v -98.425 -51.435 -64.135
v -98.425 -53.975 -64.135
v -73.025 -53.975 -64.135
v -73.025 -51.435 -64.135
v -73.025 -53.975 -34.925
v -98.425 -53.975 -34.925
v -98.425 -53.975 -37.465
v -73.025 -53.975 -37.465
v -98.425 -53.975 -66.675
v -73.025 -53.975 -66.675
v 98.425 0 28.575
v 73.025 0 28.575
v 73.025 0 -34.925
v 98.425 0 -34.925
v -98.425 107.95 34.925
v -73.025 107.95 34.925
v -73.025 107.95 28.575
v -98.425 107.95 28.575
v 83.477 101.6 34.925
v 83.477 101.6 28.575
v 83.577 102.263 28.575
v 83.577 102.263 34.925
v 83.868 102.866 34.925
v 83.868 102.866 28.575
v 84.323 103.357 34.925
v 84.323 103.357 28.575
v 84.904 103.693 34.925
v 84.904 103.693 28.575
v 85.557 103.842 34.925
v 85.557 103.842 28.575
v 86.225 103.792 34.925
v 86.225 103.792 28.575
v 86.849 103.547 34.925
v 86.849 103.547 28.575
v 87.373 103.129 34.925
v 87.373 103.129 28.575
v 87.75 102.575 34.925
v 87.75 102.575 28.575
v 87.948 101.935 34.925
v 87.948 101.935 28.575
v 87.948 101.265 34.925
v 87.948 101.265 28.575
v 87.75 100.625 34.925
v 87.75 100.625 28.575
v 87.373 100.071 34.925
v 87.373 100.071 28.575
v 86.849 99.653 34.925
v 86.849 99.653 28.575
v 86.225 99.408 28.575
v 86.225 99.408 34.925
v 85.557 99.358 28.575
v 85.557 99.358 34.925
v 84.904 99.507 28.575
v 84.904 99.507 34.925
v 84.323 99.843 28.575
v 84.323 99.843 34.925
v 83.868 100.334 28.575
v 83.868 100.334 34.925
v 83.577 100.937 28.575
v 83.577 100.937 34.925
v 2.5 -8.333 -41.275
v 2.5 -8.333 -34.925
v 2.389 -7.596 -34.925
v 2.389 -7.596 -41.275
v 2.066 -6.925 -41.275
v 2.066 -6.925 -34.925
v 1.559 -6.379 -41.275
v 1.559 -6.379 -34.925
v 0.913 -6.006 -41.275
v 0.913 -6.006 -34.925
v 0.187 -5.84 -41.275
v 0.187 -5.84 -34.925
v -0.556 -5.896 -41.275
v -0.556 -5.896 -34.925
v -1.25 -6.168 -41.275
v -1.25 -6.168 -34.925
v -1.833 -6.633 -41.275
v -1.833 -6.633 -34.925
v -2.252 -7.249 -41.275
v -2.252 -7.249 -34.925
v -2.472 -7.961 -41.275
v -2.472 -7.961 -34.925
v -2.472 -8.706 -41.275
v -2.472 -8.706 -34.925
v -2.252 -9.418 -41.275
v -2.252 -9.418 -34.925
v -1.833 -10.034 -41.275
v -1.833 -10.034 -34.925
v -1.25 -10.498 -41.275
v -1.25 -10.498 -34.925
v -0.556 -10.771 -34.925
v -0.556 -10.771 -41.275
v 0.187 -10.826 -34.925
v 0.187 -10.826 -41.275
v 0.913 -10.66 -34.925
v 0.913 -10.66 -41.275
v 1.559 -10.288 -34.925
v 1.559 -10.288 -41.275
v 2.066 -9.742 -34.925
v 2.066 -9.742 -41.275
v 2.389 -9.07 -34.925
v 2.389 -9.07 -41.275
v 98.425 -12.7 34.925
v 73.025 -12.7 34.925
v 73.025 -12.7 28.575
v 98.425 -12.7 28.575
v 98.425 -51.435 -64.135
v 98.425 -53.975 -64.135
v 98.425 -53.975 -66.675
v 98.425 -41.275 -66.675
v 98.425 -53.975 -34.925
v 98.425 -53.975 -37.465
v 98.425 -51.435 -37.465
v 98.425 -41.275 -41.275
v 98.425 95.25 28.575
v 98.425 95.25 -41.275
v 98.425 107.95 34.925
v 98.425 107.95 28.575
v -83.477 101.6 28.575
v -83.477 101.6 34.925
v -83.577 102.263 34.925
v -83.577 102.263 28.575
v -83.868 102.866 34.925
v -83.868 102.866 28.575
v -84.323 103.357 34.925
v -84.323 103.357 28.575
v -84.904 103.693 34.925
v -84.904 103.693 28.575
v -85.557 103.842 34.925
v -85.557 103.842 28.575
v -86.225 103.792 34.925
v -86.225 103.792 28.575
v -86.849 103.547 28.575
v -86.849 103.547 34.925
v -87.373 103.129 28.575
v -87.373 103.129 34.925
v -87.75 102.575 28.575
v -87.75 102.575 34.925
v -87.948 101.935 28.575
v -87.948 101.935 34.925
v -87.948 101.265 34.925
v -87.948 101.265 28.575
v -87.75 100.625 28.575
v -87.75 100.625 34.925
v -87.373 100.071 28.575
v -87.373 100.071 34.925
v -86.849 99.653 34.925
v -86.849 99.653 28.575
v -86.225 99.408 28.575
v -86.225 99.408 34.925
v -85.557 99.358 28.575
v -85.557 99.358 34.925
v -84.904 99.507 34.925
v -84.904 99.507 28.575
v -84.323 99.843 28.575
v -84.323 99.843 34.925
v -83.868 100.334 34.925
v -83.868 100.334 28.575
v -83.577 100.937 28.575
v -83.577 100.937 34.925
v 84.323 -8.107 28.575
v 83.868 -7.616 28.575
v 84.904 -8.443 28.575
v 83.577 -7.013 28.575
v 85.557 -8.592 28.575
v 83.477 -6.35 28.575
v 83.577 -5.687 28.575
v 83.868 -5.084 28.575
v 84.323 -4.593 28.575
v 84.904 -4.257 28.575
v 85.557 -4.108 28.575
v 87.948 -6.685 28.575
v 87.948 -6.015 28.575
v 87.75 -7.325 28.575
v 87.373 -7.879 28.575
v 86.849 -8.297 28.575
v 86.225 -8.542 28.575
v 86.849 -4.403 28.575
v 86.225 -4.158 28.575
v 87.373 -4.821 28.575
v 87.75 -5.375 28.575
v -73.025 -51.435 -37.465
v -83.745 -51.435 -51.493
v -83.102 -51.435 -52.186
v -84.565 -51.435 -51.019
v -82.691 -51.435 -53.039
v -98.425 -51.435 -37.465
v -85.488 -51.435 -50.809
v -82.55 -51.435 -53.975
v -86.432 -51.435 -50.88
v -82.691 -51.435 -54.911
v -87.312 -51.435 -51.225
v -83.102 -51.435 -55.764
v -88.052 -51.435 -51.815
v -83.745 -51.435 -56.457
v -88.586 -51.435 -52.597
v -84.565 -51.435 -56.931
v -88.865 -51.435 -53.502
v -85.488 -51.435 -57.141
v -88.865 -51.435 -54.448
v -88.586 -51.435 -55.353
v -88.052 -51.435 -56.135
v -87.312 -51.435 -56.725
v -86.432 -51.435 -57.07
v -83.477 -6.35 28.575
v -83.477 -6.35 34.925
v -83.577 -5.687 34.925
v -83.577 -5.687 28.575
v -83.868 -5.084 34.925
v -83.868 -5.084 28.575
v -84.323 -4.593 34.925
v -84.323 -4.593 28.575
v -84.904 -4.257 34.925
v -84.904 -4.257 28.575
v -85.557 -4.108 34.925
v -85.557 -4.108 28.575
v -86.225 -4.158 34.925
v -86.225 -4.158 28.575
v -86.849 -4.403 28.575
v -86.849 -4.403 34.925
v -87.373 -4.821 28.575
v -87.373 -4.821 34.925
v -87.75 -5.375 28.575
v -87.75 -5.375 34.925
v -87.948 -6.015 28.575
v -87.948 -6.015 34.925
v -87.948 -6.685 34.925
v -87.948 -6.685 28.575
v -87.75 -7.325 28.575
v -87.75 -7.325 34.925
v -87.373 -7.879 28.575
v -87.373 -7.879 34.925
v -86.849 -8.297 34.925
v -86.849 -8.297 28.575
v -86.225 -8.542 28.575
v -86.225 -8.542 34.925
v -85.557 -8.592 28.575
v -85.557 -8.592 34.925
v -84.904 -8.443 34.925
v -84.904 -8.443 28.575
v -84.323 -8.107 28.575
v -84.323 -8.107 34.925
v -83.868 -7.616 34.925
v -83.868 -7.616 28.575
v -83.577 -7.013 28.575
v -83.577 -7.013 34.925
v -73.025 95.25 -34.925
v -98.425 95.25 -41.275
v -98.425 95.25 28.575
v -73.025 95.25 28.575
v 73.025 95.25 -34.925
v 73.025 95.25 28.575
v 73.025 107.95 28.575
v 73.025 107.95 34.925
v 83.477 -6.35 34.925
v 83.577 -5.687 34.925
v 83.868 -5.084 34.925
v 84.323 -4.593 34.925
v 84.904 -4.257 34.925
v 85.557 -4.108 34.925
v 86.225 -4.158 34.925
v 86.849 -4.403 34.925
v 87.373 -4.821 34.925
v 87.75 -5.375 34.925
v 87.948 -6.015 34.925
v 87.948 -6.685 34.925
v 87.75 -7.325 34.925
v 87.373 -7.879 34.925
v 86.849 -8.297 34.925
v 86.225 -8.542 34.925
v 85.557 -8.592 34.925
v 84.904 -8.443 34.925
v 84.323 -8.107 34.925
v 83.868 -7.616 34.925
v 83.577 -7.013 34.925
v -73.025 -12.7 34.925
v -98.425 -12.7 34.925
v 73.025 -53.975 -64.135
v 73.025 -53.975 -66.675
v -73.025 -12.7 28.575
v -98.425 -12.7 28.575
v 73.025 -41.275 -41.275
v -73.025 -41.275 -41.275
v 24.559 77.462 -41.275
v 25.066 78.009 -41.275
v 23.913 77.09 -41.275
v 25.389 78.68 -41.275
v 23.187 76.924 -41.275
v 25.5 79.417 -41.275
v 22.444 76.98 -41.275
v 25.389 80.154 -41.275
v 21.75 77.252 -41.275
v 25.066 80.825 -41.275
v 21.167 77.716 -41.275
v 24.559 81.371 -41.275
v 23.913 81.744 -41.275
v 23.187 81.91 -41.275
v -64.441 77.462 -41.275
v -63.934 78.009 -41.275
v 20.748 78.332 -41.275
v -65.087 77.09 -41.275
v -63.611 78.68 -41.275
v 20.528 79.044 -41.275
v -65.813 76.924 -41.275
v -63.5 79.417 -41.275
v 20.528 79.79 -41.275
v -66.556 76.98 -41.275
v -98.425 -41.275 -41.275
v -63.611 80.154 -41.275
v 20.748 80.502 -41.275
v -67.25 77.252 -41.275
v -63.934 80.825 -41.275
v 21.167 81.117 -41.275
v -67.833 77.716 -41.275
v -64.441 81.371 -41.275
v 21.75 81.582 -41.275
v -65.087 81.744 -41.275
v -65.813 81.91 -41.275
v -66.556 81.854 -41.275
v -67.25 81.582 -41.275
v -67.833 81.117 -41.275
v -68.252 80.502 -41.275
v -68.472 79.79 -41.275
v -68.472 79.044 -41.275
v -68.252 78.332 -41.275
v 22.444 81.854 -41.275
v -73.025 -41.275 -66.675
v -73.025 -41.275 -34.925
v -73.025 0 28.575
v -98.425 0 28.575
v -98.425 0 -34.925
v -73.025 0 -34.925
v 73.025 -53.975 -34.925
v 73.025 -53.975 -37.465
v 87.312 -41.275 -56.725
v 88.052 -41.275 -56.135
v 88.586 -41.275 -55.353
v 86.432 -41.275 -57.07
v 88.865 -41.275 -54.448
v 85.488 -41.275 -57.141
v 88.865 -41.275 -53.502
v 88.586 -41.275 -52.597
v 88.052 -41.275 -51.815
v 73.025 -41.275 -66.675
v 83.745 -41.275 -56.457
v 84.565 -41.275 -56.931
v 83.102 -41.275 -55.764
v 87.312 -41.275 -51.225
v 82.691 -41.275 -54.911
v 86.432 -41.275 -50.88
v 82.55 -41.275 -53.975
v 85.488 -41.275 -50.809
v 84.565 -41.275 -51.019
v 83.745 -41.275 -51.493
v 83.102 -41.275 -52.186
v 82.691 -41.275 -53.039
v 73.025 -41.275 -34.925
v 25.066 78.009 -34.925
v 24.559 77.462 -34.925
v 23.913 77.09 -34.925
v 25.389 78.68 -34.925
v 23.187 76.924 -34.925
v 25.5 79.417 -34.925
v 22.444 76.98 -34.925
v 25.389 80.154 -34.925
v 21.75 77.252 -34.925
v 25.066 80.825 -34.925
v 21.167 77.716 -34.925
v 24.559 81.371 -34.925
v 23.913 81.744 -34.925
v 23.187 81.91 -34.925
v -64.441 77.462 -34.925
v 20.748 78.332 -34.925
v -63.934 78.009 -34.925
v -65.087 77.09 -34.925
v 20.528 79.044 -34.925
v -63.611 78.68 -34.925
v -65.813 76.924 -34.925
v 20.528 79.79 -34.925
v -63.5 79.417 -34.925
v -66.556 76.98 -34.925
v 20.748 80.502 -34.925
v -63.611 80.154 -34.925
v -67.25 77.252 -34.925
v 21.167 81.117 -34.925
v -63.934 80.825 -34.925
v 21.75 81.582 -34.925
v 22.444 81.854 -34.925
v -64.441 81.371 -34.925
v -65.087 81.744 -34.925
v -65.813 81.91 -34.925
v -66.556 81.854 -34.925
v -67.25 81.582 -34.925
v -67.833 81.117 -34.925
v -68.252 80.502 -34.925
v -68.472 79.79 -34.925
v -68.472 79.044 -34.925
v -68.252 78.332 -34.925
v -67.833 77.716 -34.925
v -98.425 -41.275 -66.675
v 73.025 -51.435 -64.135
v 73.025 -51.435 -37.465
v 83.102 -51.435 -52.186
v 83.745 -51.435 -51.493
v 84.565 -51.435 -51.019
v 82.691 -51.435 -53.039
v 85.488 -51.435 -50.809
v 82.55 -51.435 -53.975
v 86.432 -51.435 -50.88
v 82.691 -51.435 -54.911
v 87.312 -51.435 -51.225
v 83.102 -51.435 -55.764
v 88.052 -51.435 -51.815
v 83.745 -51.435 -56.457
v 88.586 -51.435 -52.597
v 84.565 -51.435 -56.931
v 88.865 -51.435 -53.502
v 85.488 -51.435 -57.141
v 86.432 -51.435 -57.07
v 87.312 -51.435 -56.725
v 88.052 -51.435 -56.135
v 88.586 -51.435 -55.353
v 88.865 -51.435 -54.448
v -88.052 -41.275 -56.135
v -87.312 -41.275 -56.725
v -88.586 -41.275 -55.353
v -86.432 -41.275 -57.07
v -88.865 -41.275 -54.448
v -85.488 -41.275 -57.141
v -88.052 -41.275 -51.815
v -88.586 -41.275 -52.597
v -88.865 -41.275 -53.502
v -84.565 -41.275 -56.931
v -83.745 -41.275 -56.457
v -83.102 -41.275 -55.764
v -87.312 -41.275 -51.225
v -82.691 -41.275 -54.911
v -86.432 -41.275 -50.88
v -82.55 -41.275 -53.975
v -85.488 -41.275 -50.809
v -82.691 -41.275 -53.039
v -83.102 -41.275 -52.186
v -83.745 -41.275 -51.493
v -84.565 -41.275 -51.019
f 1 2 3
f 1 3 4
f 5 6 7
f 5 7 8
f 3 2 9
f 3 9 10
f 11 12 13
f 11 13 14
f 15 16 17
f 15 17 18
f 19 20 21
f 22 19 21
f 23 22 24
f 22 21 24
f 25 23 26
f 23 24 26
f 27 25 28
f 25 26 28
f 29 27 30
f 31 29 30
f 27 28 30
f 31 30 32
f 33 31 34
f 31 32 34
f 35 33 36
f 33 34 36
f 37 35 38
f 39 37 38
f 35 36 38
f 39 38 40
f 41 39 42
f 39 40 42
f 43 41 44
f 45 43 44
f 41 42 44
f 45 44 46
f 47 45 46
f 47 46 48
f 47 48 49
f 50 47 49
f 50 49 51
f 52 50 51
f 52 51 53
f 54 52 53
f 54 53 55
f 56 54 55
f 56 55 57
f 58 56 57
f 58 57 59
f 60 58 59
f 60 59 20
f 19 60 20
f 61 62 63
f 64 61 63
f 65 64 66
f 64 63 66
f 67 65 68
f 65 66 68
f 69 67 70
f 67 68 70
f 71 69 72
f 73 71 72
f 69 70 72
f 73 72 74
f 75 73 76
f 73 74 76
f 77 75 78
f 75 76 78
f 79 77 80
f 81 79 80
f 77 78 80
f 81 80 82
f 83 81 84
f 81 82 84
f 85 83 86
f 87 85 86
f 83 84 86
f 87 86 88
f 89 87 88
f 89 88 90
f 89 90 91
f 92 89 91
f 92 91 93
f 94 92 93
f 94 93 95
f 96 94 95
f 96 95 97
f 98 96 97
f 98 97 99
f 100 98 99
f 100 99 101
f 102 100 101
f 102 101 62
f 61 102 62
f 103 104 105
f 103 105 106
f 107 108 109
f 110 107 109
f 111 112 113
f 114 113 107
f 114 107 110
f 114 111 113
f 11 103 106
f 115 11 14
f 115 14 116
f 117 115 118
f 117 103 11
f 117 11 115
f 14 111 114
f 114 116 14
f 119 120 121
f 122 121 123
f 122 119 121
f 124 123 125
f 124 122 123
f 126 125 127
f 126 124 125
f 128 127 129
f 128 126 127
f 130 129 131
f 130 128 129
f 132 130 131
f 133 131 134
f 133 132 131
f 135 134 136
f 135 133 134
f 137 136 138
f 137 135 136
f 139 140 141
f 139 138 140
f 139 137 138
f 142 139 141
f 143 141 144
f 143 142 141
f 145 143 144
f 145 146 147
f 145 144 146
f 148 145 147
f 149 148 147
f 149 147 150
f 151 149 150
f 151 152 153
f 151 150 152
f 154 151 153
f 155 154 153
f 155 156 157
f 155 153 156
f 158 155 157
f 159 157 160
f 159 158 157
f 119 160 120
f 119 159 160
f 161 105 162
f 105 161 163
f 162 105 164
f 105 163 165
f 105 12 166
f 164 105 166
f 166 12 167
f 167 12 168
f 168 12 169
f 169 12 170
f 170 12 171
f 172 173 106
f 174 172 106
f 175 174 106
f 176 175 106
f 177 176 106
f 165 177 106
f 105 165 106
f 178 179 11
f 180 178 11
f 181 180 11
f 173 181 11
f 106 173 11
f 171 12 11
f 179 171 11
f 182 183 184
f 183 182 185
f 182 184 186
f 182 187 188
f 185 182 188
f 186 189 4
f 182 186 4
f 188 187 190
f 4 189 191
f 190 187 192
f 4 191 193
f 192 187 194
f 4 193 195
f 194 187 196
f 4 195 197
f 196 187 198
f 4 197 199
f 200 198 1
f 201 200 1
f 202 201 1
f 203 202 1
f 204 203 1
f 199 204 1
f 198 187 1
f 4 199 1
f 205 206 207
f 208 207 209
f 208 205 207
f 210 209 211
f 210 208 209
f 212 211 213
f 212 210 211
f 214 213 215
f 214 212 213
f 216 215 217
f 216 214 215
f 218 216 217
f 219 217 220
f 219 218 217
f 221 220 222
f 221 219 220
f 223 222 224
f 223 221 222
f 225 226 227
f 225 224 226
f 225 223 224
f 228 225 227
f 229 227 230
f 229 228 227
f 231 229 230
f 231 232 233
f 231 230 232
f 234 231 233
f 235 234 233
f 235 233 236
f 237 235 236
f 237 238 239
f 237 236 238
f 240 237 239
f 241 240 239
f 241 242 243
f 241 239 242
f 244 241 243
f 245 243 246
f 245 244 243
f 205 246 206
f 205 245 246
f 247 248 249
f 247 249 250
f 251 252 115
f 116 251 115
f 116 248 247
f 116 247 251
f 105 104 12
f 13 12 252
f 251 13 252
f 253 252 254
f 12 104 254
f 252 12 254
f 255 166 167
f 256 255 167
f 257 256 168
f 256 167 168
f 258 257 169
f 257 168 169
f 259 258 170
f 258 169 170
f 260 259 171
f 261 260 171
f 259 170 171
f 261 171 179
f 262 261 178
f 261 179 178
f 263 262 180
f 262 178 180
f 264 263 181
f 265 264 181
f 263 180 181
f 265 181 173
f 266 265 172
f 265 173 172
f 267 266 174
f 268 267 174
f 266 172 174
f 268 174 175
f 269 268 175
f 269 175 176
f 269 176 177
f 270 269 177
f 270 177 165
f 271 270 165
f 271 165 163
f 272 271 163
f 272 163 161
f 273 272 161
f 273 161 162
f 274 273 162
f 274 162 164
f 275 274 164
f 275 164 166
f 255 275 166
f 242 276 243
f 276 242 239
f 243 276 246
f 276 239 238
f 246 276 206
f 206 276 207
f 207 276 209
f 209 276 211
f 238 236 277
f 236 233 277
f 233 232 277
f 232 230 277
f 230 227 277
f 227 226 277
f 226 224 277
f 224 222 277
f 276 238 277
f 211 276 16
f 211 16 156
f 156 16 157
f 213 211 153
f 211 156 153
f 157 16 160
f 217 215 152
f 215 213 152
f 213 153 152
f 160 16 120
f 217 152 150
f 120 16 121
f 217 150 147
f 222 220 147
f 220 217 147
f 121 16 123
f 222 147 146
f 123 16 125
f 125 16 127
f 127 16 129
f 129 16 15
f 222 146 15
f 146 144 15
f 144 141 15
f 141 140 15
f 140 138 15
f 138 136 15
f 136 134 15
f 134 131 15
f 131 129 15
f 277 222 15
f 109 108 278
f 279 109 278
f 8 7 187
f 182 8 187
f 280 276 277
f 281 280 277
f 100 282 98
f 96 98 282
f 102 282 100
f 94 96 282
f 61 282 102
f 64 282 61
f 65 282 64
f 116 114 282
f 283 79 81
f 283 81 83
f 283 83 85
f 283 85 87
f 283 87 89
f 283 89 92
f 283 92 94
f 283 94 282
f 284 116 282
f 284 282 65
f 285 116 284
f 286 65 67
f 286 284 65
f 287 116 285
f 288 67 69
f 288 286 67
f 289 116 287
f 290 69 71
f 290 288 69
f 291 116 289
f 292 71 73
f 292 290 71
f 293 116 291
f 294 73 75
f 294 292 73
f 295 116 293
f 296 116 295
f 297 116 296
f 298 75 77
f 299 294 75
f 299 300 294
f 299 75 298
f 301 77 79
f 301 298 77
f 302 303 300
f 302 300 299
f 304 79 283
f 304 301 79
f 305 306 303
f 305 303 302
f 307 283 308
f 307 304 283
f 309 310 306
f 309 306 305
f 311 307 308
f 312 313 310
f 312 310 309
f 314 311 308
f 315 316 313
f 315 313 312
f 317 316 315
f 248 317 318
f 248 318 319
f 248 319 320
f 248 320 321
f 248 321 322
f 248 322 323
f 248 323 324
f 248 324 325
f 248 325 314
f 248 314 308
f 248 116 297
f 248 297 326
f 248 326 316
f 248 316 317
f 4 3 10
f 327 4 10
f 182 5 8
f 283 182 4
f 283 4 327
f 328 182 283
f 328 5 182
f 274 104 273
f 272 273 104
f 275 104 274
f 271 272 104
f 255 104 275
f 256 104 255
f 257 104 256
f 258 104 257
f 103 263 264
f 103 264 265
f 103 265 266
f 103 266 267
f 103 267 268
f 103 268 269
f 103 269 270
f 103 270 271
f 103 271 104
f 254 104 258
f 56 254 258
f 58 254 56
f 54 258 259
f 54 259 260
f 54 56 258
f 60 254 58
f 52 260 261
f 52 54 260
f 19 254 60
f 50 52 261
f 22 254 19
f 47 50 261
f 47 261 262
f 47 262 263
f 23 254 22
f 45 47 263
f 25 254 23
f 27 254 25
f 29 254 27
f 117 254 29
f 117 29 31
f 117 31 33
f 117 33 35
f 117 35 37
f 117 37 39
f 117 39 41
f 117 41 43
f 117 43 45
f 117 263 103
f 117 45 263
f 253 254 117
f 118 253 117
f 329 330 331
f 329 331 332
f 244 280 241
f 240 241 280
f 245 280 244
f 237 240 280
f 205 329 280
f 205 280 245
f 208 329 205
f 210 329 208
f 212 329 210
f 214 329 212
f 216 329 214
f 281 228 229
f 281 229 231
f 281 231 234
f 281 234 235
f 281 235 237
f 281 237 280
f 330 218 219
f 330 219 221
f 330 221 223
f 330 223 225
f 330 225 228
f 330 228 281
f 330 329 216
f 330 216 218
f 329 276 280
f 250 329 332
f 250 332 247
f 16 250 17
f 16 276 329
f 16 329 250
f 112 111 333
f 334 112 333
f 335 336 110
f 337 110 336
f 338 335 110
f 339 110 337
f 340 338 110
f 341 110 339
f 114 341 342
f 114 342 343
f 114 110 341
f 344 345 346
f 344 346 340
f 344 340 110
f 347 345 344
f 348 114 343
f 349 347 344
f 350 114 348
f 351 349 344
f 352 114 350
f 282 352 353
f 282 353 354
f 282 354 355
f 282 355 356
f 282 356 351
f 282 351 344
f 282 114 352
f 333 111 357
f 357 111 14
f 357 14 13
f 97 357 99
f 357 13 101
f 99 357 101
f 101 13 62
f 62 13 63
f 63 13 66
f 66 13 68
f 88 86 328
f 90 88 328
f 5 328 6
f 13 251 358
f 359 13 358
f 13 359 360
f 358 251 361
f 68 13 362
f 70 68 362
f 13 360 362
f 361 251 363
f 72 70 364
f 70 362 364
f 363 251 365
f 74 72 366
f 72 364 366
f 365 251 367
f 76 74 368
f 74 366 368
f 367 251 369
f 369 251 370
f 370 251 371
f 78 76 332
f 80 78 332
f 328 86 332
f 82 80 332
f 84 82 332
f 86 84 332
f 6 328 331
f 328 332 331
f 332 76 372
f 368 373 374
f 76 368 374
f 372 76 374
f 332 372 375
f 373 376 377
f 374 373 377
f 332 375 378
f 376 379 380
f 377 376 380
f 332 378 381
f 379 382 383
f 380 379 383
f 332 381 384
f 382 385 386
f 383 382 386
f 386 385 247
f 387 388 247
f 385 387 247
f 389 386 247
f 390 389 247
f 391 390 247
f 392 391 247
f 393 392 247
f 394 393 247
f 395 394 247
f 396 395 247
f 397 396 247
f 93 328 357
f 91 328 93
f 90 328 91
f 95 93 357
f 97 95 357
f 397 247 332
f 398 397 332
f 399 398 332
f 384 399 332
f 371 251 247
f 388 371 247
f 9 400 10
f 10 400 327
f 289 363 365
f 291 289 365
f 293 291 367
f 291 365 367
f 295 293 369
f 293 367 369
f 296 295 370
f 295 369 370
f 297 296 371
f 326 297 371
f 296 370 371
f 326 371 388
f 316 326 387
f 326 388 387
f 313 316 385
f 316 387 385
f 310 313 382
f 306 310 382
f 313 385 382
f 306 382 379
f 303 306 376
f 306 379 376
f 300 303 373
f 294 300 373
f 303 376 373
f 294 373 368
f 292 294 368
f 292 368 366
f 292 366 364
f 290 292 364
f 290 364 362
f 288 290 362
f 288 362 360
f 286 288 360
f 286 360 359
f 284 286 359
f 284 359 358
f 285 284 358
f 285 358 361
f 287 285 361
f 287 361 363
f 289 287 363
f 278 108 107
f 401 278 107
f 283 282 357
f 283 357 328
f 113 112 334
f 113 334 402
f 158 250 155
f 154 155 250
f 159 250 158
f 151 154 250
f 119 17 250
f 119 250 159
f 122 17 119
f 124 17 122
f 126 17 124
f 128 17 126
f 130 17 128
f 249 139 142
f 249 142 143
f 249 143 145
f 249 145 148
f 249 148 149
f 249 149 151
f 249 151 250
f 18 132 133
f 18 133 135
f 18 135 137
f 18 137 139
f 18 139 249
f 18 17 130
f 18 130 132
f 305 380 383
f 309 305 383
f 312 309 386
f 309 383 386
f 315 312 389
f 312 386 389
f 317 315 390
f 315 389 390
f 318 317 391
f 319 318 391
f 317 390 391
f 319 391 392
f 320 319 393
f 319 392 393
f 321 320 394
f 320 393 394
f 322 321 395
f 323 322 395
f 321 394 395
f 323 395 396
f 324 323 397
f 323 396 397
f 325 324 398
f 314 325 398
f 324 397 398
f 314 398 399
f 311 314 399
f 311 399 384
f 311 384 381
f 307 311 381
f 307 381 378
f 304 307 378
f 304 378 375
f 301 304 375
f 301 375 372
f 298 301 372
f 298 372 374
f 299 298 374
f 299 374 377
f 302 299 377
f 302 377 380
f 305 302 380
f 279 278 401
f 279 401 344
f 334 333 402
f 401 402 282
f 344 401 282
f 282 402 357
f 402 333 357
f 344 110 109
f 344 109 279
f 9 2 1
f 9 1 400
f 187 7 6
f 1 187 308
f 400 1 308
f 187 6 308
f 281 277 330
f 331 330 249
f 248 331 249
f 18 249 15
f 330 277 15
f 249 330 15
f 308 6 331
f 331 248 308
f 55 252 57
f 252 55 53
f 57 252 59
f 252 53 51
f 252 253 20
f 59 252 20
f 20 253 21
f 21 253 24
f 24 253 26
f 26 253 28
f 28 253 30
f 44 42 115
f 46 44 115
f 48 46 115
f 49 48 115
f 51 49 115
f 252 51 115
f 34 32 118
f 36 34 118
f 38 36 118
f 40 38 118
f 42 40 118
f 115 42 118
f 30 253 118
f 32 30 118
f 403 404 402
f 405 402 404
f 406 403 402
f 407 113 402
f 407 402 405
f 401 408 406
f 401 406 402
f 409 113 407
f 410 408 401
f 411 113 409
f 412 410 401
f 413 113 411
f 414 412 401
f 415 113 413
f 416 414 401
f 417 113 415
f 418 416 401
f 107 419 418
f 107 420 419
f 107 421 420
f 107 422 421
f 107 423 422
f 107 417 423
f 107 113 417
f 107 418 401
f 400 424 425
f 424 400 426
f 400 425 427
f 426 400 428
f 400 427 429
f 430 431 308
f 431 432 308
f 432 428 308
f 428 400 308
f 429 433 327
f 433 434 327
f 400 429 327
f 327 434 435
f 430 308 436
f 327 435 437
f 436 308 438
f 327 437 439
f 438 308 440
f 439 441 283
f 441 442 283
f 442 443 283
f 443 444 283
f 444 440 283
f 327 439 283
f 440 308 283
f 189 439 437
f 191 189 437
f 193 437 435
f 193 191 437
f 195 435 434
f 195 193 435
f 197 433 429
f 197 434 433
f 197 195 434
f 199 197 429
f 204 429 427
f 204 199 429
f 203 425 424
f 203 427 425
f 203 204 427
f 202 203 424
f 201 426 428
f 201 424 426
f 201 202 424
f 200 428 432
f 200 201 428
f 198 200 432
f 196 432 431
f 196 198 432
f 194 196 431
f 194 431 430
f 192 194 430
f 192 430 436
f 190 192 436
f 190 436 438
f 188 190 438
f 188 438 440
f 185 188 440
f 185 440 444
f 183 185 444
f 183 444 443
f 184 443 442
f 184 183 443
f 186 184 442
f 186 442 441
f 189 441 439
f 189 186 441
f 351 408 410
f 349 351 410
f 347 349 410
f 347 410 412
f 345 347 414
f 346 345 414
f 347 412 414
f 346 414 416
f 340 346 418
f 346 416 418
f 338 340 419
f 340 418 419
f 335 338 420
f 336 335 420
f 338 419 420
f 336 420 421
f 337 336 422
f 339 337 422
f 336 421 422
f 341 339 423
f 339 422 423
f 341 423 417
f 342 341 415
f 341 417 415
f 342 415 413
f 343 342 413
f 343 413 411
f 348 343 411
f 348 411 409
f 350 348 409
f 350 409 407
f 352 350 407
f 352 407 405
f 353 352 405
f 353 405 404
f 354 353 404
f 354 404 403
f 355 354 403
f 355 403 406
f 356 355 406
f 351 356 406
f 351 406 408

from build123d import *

# Parameters (mm, degrees)
SKETCH1_W                   = 196.85
SKETCH1_H                   = 82.55
BOSS_EXTRUDE1_DEPTH         = 95.25
SKETCH3_W                   = 146.05
SKETCH3_H                   = 76.2
CUT_EXTRUDE1_DEPTH          = 144.051280141
SKETCH4_W                   = 25.4
SKETCH4_H                   = 53.975
BOSS_EXTRUDE2_DEPTH         = 6.35
SKETCH5_W                   = 25.4
SKETCH5_H                   = 12.7
BOSS_EXTRUDE3_DEPTH         = 25.4
SKETCH6_W                   = 26.67
SKETCH6_H                   = 2.54
CUT_EXTRUDE2_DEPTH          = 229.622047548
F_1_4_0_25_DIAMETER_HOLE1_D = 6.35
SKETCH16_W                  = 196.85
SKETCH16_H                  = 6.35
CUT_EXTRUDE3_DEPTH          = 191.790819682
BOSS_EXTRUDE4_START         = -6.35
SKETCH11_W                  = 25.4
SKETCH11_H                  = 12.7
BOSS_EXTRUDE4_DEPTH         = 6.35
F_8_CLEARANCE_HOLE1_D       = 4.4958
F_8_CLEARANCE_HOLE1_DEPTH   = 12.7
SKETCH14_W                  = 146.05
SKETCH14_H                  = 41.275
BOSS_EXTRUDE5_DEPTH         = 6.35
M6X1_0_TAPPED_HOLE1_D       = 5
M6X1_0_TAPPED_HOLE1_DEPTH   = 14.986
M6X1_0_TAPPED_HOLE1_TIP     = 1.502151548


with BuildPart() as part:
    # Sketch1 → Boss-Extrude1 (new body)
    with BuildSketch(Plane(origin=(0, 0, 0), x_dir=(1, 0, 0), z_dir=(0, 1, 0))):
        Rectangle(SKETCH1_W, SKETCH1_H)
    extrude(amount=BOSS_EXTRUDE1_DEPTH)

    # Sketch3 → Cut-Extrude1 (cut, through all)
    with BuildSketch(Plane(origin=(0, 95.25, 0), x_dir=(1, 0, 0), z_dir=(0, 1, 0))):
        with Locations((0, -3.175)):
            Rectangle(SKETCH3_W, SKETCH3_H)
    extrude(amount=-CUT_EXTRUDE1_DEPTH, mode=Mode.SUBTRACT)

    # Sketch4 → Boss-Extrude2 (add)
    with BuildSketch(Plane(origin=(0, 0, -41.275), x_dir=(-1, 0, 0), z_dir=(0, 0, -1))):
        with Locations((-85.725, -26.9875)):
            Rectangle(SKETCH4_W, SKETCH4_H)
    boss_extrude2 = extrude(amount=-BOSS_EXTRUDE2_DEPTH)

    # Sketch5 → Boss-Extrude3 (add)
    with BuildSketch(Plane(origin=(0, 0, -41.275), x_dir=(-1, 0, 0), z_dir=(0, 0, -1))):
        with Locations((-85.725, -47.625)):
            Rectangle(SKETCH5_W, SKETCH5_H)
    boss_extrude3 = extrude(amount=BOSS_EXTRUDE3_DEPTH)

    # Sketch6 → Cut-Extrude2 (cut, through all)
    with BuildSketch(Plane(origin=(98.425, 0, 0), x_dir=(0, 0, -1), z_dir=(1, 0, 0))):
        with Locations((50.8, -52.705)):
            Rectangle(SKETCH6_W, SKETCH6_H)
    cut_extrude2 = extrude(amount=-CUT_EXTRUDE2_DEPTH, mode=Mode.SUBTRACT)

    # 1/4 (0.25) Diameter Hole1 (through all)
    with Locations(Plane(origin=(0, -41.275, 0), x_dir=(1, 0, 0), z_dir=(0, 1, 0))):
        with Locations((85.725, 53.975)):
            f_1_4_0_25_diameter_hole1 = Hole(F_1_4_0_25_DIAMETER_HOLE1_D / 2)

    # Sketch16 → Cut-Extrude3 (cut, through all)
    with BuildSketch(Plane(origin=(0, 95.25, 0), x_dir=(1, 0, 0), z_dir=(0, 1, 0))):
        with Locations((0, -38.1)):
            Rectangle(SKETCH16_W, SKETCH16_H)
    extrude(amount=-CUT_EXTRUDE3_DEPTH, mode=Mode.SUBTRACT)

    # Sketch11 → Boss-Extrude4 (add)
    with BuildSketch(Plane.XY.offset(41.275).offset(BOSS_EXTRUDE4_START)):
        with Locations((85.725, 101.6)):
            Rectangle(SKETCH11_W, SKETCH11_H)
        with Locations((85.725, -6.35)):
            Rectangle(SKETCH11_W, SKETCH11_H)
    boss_extrude4 = extrude(amount=-BOSS_EXTRUDE4_DEPTH)

    # #8 Clearance Hole1
    with Locations(Plane.XY.offset(41.275)):
        with Locations((85.725, 101.6), (85.725, -6.35)):
            f_8_clearance_hole1 = Hole(F_8_CLEARANCE_HOLE1_D / 2, depth=F_8_CLEARANCE_HOLE1_DEPTH)

    # Mirror1: Boss-Extrude2, Boss-Extrude3, Cut-Extrude2, 1/4 (0.25) Diameter Hole1, Boss-Extrude4, #8 Clearance Hole1 across plane
    add(boss_extrude2.mirror(Plane(origin=(0, 0, 0), x_dir=(0, 0, 1), z_dir=(1, 0, 0))))
    add(boss_extrude3.mirror(Plane(origin=(0, 0, 0), x_dir=(0, 0, 1), z_dir=(1, 0, 0))))
    add(cut_extrude2.mirror(Plane(origin=(0, 0, 0), x_dir=(0, 0, 1), z_dir=(1, 0, 0))), mode=Mode.SUBTRACT)
    add(f_1_4_0_25_diameter_hole1.mirror(Plane(origin=(0, 0, 0), x_dir=(0, 0, 1), z_dir=(1, 0, 0))), mode=Mode.SUBTRACT)
    add(boss_extrude4.mirror(Plane(origin=(0, 0, 0), x_dir=(0, 0, 1), z_dir=(1, 0, 0))))
    add(f_8_clearance_hole1.mirror(Plane(origin=(0, 0, 0), x_dir=(0, 0, 1), z_dir=(1, 0, 0))), mode=Mode.SUBTRACT)

    # Sketch14 → Boss-Extrude5 (add)
    with BuildSketch(Plane(origin=(0, 0, -41.275), x_dir=(-1, 0, 0), z_dir=(0, 0, -1))):
        with Locations((0, -20.6375)):
            Rectangle(SKETCH14_W, SKETCH14_H)
    extrude(amount=-BOSS_EXTRUDE5_DEPTH)

    # M6x1.0 Tapped Hole1
    with Locations(Plane(origin=(0, 0, -41.275), x_dir=(-1, 0, 0), z_dir=(0, 0, -1))):
        with Locations((-23, 79.416895565), (66, 79.416895565), (0, -8.333218687)):
            Hole(M6X1_0_TAPPED_HOLE1_D / 2, depth=M6X1_0_TAPPED_HOLE1_DEPTH)
            with Locations((0, 0, -(M6X1_0_TAPPED_HOLE1_DEPTH + M6X1_0_TAPPED_HOLE1_TIP / 2))):  # 118° drill point
                Cone(0, M6X1_0_TAPPED_HOLE1_D / 2, M6X1_0_TAPPED_HOLE1_TIP, mode=Mode.SUBTRACT)


solid = part.part
